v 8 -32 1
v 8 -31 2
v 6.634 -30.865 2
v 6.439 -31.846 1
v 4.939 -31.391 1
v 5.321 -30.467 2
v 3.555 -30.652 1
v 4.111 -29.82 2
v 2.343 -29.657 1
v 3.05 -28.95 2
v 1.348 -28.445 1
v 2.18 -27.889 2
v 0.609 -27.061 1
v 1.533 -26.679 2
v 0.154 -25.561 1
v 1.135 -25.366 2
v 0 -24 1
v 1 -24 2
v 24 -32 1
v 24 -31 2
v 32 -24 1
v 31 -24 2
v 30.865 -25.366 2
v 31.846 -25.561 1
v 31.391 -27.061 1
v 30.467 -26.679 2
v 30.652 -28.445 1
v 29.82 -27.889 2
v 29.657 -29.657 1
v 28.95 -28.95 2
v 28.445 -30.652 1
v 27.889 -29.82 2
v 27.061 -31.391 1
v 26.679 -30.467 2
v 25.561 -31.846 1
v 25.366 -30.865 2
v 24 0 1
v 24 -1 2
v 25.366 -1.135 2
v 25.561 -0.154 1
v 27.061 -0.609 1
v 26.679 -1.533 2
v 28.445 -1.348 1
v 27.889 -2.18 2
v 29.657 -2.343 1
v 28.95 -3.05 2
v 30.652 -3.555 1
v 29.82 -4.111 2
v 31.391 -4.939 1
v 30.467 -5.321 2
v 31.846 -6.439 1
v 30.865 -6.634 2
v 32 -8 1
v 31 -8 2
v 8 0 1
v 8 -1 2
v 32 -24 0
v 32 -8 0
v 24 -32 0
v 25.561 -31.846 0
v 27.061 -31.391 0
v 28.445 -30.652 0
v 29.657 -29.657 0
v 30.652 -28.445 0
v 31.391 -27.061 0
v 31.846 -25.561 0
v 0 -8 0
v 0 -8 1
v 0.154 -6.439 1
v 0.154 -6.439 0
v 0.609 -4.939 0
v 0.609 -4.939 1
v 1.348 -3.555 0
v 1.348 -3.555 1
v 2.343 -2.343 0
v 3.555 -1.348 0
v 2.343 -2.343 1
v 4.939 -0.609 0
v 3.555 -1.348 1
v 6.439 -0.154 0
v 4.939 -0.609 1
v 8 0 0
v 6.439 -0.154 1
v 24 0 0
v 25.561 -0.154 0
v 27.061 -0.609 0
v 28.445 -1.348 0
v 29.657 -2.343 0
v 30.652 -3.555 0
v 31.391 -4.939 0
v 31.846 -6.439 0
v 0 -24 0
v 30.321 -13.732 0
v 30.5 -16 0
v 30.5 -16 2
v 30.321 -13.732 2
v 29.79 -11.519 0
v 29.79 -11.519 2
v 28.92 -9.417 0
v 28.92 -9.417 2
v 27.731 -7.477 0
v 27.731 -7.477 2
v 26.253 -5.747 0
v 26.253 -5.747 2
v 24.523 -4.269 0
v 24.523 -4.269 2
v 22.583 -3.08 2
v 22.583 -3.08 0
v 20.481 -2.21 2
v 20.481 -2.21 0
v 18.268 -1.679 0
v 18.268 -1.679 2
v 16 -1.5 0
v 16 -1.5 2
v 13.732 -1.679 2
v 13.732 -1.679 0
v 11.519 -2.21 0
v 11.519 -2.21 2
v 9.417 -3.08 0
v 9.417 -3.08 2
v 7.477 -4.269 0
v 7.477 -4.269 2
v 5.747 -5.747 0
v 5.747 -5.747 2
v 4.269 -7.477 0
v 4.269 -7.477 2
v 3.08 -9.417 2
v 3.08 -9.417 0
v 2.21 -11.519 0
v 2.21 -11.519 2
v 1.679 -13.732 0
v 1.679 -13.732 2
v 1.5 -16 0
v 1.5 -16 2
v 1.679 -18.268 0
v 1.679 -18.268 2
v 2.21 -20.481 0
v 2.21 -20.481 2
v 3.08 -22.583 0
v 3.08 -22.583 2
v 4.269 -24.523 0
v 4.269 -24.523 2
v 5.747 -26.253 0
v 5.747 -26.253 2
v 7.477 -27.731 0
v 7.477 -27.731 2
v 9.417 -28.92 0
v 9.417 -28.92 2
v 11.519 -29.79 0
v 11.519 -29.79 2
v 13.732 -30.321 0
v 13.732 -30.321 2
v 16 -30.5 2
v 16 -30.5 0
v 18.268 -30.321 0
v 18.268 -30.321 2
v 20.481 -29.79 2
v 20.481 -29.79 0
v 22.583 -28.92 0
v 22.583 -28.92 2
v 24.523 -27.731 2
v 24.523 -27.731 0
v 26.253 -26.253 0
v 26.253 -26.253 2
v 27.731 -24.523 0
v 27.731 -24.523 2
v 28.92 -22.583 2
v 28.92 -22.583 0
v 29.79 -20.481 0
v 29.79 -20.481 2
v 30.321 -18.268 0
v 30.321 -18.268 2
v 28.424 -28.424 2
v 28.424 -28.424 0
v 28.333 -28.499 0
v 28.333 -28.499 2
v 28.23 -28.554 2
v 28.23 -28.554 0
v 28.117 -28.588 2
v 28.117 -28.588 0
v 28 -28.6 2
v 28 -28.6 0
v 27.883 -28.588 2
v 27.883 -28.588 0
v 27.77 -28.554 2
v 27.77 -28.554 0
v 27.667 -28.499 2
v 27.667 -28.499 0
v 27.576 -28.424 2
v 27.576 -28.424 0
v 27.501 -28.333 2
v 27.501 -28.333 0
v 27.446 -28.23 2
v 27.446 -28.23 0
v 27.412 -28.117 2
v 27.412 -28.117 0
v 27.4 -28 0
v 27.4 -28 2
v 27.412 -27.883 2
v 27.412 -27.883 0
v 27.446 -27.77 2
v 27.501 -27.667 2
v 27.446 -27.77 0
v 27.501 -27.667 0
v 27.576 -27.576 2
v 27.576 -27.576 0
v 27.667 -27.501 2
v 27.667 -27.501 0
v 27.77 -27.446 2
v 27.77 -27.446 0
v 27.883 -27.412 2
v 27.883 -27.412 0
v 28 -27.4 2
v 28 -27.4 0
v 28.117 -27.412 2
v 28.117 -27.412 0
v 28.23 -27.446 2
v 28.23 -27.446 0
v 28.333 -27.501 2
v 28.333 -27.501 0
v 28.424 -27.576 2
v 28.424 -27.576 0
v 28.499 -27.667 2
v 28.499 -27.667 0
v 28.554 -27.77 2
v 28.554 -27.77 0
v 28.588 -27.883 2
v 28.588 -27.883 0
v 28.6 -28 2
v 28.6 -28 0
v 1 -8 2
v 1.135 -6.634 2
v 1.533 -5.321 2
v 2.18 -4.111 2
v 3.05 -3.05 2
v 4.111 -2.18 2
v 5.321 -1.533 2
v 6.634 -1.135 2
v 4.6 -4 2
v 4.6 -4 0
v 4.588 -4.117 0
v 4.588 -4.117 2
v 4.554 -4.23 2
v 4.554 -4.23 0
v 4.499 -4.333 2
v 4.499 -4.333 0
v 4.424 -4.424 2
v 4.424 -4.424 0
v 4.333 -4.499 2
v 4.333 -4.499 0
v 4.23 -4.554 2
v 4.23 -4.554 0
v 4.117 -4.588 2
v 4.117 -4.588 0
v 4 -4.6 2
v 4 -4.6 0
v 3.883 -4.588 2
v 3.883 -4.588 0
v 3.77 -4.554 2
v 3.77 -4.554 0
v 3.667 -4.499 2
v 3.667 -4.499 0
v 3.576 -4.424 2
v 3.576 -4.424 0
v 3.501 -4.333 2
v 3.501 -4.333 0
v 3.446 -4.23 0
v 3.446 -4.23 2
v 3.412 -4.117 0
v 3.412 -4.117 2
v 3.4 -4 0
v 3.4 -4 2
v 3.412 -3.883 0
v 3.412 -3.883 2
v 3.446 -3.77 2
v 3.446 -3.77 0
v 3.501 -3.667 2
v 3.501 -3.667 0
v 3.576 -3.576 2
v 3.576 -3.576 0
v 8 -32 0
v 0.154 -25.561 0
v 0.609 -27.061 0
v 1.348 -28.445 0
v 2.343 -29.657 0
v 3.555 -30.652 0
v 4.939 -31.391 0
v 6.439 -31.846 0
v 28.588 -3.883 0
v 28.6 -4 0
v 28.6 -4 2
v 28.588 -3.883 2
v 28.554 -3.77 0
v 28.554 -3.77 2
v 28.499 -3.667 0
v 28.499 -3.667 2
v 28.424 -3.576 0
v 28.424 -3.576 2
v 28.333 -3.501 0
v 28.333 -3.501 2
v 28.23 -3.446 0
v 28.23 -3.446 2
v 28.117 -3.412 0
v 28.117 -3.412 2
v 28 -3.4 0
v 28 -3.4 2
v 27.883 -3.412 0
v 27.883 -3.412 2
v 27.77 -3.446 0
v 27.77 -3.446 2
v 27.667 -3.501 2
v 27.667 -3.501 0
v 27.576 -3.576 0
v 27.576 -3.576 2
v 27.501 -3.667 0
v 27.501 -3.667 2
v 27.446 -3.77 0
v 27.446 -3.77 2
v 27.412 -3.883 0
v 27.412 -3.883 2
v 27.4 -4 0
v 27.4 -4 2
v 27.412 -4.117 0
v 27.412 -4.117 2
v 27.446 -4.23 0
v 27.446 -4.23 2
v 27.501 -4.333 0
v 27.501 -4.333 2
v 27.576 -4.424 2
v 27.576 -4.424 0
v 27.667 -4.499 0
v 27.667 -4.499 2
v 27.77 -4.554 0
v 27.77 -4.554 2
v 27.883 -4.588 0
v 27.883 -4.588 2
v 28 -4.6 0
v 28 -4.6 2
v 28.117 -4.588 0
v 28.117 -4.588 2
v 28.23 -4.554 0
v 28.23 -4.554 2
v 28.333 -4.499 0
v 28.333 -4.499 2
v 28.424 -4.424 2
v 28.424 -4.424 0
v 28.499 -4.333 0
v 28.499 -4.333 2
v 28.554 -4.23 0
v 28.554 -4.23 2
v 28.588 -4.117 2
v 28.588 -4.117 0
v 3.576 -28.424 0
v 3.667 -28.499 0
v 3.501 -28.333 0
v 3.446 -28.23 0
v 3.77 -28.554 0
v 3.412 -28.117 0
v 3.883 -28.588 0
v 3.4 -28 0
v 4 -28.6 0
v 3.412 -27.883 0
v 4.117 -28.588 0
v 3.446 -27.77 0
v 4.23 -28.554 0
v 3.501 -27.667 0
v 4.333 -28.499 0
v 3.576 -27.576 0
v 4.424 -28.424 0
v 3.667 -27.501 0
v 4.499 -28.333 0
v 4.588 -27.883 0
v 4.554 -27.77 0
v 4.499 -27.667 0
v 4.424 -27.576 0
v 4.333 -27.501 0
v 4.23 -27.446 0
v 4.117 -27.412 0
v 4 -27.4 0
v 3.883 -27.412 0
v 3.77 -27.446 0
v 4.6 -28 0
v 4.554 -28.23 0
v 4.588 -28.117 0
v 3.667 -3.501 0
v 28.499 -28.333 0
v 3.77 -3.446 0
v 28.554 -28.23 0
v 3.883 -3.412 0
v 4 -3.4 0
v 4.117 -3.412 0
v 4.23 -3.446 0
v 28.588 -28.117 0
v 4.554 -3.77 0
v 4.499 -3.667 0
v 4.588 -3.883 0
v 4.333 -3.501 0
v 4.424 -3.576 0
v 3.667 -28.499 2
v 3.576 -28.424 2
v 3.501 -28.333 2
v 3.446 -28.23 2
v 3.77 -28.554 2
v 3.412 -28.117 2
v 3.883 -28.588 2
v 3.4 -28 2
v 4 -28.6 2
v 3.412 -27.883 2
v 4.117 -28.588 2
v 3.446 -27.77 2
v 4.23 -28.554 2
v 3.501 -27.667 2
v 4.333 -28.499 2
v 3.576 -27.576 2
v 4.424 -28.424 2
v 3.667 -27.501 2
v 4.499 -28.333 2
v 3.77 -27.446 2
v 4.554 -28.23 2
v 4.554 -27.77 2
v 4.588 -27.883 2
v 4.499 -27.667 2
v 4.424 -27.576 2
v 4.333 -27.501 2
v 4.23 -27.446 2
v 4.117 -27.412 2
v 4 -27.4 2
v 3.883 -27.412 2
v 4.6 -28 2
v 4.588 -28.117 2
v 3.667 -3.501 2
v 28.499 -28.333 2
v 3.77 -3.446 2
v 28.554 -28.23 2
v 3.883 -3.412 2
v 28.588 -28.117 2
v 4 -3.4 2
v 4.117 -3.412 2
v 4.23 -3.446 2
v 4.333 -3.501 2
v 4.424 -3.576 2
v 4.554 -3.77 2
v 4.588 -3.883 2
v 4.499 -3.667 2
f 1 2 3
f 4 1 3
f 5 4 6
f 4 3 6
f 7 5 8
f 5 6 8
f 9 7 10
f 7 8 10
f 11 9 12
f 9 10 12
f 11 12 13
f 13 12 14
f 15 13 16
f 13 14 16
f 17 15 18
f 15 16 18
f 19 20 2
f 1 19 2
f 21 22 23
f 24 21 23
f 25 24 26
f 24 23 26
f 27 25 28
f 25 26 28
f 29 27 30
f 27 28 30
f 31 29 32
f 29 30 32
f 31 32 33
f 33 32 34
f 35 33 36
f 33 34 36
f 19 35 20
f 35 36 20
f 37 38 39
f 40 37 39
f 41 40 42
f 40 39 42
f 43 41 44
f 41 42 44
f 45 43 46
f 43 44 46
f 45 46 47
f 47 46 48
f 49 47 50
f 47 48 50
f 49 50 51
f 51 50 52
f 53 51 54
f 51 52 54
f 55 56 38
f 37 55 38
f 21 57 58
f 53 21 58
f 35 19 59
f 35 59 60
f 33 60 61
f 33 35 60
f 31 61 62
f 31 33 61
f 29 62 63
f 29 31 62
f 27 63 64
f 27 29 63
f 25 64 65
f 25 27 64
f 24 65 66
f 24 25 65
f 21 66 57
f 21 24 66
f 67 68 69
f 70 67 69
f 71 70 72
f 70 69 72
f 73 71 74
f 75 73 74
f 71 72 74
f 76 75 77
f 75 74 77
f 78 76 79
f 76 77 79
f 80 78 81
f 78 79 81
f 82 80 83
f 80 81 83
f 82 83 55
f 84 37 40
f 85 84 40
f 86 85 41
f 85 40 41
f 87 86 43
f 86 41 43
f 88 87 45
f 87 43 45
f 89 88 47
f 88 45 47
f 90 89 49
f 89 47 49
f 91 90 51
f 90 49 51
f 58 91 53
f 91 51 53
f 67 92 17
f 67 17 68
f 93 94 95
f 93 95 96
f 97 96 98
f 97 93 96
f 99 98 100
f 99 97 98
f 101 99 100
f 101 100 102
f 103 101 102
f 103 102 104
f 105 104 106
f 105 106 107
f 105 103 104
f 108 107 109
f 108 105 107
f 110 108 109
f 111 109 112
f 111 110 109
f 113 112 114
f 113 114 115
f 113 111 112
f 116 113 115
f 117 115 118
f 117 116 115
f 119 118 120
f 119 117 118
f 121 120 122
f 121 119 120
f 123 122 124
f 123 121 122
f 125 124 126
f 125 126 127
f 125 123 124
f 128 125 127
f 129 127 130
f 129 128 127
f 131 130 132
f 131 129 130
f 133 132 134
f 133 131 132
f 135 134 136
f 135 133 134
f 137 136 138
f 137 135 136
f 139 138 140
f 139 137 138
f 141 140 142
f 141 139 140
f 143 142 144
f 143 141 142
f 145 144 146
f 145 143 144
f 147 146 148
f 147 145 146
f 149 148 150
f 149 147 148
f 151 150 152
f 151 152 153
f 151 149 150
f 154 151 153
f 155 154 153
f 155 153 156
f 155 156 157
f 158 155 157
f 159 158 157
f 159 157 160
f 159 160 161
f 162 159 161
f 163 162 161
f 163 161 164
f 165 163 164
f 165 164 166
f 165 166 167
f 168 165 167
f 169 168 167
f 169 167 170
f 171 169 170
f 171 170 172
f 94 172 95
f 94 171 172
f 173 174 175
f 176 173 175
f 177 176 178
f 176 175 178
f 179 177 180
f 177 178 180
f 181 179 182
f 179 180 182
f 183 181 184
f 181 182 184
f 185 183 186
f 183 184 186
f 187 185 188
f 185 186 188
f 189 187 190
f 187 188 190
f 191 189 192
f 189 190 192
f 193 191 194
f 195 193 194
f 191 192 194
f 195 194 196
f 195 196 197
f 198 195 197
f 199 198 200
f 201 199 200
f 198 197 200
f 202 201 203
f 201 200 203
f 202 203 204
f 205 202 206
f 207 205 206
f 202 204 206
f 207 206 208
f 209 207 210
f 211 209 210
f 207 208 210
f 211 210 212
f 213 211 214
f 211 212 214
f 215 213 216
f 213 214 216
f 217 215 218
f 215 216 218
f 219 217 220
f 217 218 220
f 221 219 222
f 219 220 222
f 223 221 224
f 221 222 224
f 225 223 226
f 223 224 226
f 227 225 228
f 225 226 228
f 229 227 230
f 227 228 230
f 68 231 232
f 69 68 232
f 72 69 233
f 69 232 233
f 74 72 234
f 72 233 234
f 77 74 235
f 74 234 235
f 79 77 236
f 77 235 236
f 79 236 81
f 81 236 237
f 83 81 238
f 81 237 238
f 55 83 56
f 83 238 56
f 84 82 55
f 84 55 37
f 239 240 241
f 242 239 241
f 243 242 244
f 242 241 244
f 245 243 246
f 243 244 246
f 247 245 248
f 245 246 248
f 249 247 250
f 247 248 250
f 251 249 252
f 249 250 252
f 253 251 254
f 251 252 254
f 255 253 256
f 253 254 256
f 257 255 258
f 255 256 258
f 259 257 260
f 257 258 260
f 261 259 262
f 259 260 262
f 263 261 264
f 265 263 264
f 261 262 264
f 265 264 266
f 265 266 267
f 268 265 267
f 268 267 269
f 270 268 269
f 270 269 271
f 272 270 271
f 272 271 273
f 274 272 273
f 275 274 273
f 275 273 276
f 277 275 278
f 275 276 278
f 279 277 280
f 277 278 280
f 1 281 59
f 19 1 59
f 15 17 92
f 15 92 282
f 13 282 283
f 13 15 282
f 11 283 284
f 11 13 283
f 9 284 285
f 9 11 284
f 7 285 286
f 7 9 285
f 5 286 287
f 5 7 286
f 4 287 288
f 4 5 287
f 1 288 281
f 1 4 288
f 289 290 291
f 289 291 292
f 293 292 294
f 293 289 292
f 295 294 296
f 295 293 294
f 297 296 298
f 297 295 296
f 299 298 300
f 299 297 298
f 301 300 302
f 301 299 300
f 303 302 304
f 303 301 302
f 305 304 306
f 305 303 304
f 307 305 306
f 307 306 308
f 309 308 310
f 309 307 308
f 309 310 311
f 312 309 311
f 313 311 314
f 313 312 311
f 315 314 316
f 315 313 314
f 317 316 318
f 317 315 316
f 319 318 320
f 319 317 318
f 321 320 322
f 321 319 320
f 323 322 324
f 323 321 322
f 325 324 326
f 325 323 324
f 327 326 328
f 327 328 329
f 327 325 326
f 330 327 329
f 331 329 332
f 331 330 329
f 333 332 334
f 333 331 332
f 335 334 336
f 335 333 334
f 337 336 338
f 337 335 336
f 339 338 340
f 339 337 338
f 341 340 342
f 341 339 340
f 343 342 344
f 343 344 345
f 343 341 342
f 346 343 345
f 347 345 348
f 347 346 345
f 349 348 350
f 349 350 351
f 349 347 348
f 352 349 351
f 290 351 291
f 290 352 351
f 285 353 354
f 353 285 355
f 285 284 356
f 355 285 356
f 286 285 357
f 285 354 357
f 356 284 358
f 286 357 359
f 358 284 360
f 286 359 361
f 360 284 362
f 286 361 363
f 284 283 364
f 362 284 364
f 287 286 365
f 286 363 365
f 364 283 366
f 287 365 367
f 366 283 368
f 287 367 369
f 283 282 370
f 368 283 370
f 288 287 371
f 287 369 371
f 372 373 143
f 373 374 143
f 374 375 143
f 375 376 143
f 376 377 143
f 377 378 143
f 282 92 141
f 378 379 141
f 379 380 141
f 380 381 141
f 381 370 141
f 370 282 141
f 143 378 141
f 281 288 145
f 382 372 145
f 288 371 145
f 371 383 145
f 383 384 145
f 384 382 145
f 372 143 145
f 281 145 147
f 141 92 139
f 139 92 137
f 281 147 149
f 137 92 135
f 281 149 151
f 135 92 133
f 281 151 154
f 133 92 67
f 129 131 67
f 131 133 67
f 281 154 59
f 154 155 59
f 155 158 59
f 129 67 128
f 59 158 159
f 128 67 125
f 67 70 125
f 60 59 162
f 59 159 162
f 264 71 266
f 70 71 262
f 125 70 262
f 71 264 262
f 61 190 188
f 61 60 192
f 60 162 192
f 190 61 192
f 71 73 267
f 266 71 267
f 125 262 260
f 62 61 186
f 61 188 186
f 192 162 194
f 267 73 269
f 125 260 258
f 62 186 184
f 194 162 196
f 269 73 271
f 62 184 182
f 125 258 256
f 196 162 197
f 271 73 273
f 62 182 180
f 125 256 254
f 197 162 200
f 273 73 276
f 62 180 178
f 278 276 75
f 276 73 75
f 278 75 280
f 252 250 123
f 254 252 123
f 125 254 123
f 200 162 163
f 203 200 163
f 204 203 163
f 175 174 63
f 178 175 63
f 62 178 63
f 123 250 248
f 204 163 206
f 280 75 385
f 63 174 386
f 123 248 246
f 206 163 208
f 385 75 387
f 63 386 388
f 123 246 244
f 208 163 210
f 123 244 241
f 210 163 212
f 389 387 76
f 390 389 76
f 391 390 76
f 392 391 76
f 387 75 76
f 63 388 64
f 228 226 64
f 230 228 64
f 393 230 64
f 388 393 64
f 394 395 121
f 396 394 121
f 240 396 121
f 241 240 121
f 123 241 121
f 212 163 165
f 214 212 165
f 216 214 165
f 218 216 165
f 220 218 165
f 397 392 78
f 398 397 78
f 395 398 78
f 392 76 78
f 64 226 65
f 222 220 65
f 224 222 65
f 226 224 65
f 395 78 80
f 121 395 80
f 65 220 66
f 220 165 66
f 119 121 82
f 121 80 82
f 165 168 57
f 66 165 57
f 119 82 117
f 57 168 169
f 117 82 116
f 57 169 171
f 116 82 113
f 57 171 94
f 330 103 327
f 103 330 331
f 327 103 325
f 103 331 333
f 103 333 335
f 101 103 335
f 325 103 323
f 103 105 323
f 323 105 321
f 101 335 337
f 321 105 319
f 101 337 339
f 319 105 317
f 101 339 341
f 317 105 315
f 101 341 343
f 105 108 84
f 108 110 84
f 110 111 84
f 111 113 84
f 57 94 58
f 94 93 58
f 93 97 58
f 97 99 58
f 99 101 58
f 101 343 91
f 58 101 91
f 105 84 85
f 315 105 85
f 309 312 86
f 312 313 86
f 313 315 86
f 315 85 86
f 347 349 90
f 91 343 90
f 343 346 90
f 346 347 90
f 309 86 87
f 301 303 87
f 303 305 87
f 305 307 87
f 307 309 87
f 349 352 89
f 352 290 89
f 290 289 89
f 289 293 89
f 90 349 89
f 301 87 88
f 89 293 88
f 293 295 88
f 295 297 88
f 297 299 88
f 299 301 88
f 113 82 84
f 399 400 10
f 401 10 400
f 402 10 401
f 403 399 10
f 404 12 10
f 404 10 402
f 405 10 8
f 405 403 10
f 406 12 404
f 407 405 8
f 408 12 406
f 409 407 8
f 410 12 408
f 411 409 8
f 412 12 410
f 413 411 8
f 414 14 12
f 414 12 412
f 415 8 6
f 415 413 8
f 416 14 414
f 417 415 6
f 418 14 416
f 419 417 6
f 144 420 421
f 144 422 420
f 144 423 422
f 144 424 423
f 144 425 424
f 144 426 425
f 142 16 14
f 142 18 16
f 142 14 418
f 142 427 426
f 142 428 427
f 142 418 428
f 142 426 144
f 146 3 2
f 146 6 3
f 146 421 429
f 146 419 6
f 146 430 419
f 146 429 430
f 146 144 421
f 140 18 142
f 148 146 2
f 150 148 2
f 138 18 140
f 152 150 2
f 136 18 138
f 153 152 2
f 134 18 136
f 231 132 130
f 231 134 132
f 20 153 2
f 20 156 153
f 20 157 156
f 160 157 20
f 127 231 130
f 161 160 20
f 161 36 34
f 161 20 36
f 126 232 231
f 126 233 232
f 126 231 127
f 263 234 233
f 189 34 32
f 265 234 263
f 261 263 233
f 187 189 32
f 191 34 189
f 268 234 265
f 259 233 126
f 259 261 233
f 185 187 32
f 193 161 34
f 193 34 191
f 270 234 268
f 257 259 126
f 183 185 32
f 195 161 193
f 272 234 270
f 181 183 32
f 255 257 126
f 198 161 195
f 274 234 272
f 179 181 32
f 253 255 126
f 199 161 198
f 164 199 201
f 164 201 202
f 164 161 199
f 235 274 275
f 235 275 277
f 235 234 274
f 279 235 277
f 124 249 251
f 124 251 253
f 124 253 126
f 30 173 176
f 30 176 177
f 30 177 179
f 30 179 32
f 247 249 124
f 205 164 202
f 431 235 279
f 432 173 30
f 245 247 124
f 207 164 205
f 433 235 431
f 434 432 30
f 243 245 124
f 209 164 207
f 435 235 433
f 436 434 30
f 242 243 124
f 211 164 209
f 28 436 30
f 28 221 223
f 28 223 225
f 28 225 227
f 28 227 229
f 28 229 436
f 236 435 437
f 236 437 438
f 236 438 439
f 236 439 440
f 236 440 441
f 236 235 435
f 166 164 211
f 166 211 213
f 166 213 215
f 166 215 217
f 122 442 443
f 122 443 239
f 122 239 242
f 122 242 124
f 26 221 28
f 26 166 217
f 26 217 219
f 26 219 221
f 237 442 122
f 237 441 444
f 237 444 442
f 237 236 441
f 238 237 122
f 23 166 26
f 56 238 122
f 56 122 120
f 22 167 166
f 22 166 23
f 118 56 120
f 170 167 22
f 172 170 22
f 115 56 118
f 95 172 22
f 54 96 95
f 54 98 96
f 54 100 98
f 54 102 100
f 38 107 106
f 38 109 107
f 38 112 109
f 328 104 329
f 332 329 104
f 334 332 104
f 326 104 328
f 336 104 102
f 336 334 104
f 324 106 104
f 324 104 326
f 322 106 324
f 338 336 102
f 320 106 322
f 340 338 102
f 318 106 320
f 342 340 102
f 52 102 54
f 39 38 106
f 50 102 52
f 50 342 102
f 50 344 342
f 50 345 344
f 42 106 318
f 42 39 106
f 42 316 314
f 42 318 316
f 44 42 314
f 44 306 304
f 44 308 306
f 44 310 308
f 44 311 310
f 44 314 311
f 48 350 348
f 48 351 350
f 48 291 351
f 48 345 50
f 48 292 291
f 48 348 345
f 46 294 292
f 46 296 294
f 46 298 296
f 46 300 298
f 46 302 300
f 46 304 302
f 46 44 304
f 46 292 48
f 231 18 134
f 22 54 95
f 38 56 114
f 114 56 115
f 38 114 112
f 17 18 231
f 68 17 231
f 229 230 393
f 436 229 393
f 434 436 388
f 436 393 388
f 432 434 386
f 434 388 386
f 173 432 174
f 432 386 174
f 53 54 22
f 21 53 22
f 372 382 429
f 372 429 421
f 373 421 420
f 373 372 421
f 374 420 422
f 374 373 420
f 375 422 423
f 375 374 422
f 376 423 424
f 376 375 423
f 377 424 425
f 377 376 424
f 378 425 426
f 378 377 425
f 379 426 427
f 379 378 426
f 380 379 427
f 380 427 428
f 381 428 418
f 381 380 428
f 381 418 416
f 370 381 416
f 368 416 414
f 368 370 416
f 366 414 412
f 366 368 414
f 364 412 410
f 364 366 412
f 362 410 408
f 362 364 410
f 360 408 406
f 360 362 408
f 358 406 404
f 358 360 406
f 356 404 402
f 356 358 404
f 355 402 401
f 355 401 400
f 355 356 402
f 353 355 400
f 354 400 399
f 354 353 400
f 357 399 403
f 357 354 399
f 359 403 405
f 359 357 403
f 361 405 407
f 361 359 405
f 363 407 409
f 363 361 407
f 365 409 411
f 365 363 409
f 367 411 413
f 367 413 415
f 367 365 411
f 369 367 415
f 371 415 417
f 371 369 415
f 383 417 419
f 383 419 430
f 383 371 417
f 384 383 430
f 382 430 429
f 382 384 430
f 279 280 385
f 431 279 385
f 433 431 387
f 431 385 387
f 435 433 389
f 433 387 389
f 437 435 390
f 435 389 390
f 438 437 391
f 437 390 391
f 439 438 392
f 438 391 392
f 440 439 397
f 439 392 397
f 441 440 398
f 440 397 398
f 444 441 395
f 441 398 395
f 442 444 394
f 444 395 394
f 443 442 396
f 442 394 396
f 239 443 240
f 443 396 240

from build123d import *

# Parameters (mm, degrees)
F0_W     = 32
F0_H     = 32
F0_R     = 0.6
F0_R_2   = 14.5
F1_DEPTH = 2
F2_R     = 8
F3_SIZE  = 1


with BuildPart() as f1:
    # F0 (on Top) → F1 (new body)
    with BuildSketch(Plane.XY):
        with Locations((16, -16)):
            Rectangle(F0_W, F0_H)
        with Locations((4, -28)):
            Circle(F0_R, mode=Mode.SUBTRACT)
        with BuildLine():
            ThreePointArc((28.6, -28), (28.5543277195, -28.2296100594), (28.4242640687, -28.4242640687))
            ThreePointArc((28.4242640687, -28.4242640687), (27.4456722805, -27.7703899406), (28.6, -28))
        make_face(mode=Mode.SUBTRACT)
        with BuildLine():
            ThreePointArc((4.6, -4), (3.7703899406, -4.5543277195), (3.5757359313, -3.5757359313))
            ThreePointArc((3.5757359313, -3.5757359313), (4.2296100594, -3.4456722805), (4.6, -4))
        make_face(mode=Mode.SUBTRACT)
        with Locations((16, -16)):
            Circle(F0_R_2, mode=Mode.SUBTRACT)
        with Locations((28, -4)):
            Circle(F0_R, mode=Mode.SUBTRACT)
    extrude(amount=F1_DEPTH)

    # F2
    f2_edges = [f1.edges().sort_by_distance(p)[0] for p in [
        (32, 0, 1),
        (0, 0, 1),
        (0, -32, 1),
        (32, -32, 1),
    ]]
    fillet(f2_edges, radius=F2_R)

    # F3
    f3_edges = [f1.edges().sort_by_distance(p)[0] for p in [
        (2.343146, -2.343146, 2),
    ]]
    chamfer(f3_edges, length=F3_SIZE)


solid = f1.part
